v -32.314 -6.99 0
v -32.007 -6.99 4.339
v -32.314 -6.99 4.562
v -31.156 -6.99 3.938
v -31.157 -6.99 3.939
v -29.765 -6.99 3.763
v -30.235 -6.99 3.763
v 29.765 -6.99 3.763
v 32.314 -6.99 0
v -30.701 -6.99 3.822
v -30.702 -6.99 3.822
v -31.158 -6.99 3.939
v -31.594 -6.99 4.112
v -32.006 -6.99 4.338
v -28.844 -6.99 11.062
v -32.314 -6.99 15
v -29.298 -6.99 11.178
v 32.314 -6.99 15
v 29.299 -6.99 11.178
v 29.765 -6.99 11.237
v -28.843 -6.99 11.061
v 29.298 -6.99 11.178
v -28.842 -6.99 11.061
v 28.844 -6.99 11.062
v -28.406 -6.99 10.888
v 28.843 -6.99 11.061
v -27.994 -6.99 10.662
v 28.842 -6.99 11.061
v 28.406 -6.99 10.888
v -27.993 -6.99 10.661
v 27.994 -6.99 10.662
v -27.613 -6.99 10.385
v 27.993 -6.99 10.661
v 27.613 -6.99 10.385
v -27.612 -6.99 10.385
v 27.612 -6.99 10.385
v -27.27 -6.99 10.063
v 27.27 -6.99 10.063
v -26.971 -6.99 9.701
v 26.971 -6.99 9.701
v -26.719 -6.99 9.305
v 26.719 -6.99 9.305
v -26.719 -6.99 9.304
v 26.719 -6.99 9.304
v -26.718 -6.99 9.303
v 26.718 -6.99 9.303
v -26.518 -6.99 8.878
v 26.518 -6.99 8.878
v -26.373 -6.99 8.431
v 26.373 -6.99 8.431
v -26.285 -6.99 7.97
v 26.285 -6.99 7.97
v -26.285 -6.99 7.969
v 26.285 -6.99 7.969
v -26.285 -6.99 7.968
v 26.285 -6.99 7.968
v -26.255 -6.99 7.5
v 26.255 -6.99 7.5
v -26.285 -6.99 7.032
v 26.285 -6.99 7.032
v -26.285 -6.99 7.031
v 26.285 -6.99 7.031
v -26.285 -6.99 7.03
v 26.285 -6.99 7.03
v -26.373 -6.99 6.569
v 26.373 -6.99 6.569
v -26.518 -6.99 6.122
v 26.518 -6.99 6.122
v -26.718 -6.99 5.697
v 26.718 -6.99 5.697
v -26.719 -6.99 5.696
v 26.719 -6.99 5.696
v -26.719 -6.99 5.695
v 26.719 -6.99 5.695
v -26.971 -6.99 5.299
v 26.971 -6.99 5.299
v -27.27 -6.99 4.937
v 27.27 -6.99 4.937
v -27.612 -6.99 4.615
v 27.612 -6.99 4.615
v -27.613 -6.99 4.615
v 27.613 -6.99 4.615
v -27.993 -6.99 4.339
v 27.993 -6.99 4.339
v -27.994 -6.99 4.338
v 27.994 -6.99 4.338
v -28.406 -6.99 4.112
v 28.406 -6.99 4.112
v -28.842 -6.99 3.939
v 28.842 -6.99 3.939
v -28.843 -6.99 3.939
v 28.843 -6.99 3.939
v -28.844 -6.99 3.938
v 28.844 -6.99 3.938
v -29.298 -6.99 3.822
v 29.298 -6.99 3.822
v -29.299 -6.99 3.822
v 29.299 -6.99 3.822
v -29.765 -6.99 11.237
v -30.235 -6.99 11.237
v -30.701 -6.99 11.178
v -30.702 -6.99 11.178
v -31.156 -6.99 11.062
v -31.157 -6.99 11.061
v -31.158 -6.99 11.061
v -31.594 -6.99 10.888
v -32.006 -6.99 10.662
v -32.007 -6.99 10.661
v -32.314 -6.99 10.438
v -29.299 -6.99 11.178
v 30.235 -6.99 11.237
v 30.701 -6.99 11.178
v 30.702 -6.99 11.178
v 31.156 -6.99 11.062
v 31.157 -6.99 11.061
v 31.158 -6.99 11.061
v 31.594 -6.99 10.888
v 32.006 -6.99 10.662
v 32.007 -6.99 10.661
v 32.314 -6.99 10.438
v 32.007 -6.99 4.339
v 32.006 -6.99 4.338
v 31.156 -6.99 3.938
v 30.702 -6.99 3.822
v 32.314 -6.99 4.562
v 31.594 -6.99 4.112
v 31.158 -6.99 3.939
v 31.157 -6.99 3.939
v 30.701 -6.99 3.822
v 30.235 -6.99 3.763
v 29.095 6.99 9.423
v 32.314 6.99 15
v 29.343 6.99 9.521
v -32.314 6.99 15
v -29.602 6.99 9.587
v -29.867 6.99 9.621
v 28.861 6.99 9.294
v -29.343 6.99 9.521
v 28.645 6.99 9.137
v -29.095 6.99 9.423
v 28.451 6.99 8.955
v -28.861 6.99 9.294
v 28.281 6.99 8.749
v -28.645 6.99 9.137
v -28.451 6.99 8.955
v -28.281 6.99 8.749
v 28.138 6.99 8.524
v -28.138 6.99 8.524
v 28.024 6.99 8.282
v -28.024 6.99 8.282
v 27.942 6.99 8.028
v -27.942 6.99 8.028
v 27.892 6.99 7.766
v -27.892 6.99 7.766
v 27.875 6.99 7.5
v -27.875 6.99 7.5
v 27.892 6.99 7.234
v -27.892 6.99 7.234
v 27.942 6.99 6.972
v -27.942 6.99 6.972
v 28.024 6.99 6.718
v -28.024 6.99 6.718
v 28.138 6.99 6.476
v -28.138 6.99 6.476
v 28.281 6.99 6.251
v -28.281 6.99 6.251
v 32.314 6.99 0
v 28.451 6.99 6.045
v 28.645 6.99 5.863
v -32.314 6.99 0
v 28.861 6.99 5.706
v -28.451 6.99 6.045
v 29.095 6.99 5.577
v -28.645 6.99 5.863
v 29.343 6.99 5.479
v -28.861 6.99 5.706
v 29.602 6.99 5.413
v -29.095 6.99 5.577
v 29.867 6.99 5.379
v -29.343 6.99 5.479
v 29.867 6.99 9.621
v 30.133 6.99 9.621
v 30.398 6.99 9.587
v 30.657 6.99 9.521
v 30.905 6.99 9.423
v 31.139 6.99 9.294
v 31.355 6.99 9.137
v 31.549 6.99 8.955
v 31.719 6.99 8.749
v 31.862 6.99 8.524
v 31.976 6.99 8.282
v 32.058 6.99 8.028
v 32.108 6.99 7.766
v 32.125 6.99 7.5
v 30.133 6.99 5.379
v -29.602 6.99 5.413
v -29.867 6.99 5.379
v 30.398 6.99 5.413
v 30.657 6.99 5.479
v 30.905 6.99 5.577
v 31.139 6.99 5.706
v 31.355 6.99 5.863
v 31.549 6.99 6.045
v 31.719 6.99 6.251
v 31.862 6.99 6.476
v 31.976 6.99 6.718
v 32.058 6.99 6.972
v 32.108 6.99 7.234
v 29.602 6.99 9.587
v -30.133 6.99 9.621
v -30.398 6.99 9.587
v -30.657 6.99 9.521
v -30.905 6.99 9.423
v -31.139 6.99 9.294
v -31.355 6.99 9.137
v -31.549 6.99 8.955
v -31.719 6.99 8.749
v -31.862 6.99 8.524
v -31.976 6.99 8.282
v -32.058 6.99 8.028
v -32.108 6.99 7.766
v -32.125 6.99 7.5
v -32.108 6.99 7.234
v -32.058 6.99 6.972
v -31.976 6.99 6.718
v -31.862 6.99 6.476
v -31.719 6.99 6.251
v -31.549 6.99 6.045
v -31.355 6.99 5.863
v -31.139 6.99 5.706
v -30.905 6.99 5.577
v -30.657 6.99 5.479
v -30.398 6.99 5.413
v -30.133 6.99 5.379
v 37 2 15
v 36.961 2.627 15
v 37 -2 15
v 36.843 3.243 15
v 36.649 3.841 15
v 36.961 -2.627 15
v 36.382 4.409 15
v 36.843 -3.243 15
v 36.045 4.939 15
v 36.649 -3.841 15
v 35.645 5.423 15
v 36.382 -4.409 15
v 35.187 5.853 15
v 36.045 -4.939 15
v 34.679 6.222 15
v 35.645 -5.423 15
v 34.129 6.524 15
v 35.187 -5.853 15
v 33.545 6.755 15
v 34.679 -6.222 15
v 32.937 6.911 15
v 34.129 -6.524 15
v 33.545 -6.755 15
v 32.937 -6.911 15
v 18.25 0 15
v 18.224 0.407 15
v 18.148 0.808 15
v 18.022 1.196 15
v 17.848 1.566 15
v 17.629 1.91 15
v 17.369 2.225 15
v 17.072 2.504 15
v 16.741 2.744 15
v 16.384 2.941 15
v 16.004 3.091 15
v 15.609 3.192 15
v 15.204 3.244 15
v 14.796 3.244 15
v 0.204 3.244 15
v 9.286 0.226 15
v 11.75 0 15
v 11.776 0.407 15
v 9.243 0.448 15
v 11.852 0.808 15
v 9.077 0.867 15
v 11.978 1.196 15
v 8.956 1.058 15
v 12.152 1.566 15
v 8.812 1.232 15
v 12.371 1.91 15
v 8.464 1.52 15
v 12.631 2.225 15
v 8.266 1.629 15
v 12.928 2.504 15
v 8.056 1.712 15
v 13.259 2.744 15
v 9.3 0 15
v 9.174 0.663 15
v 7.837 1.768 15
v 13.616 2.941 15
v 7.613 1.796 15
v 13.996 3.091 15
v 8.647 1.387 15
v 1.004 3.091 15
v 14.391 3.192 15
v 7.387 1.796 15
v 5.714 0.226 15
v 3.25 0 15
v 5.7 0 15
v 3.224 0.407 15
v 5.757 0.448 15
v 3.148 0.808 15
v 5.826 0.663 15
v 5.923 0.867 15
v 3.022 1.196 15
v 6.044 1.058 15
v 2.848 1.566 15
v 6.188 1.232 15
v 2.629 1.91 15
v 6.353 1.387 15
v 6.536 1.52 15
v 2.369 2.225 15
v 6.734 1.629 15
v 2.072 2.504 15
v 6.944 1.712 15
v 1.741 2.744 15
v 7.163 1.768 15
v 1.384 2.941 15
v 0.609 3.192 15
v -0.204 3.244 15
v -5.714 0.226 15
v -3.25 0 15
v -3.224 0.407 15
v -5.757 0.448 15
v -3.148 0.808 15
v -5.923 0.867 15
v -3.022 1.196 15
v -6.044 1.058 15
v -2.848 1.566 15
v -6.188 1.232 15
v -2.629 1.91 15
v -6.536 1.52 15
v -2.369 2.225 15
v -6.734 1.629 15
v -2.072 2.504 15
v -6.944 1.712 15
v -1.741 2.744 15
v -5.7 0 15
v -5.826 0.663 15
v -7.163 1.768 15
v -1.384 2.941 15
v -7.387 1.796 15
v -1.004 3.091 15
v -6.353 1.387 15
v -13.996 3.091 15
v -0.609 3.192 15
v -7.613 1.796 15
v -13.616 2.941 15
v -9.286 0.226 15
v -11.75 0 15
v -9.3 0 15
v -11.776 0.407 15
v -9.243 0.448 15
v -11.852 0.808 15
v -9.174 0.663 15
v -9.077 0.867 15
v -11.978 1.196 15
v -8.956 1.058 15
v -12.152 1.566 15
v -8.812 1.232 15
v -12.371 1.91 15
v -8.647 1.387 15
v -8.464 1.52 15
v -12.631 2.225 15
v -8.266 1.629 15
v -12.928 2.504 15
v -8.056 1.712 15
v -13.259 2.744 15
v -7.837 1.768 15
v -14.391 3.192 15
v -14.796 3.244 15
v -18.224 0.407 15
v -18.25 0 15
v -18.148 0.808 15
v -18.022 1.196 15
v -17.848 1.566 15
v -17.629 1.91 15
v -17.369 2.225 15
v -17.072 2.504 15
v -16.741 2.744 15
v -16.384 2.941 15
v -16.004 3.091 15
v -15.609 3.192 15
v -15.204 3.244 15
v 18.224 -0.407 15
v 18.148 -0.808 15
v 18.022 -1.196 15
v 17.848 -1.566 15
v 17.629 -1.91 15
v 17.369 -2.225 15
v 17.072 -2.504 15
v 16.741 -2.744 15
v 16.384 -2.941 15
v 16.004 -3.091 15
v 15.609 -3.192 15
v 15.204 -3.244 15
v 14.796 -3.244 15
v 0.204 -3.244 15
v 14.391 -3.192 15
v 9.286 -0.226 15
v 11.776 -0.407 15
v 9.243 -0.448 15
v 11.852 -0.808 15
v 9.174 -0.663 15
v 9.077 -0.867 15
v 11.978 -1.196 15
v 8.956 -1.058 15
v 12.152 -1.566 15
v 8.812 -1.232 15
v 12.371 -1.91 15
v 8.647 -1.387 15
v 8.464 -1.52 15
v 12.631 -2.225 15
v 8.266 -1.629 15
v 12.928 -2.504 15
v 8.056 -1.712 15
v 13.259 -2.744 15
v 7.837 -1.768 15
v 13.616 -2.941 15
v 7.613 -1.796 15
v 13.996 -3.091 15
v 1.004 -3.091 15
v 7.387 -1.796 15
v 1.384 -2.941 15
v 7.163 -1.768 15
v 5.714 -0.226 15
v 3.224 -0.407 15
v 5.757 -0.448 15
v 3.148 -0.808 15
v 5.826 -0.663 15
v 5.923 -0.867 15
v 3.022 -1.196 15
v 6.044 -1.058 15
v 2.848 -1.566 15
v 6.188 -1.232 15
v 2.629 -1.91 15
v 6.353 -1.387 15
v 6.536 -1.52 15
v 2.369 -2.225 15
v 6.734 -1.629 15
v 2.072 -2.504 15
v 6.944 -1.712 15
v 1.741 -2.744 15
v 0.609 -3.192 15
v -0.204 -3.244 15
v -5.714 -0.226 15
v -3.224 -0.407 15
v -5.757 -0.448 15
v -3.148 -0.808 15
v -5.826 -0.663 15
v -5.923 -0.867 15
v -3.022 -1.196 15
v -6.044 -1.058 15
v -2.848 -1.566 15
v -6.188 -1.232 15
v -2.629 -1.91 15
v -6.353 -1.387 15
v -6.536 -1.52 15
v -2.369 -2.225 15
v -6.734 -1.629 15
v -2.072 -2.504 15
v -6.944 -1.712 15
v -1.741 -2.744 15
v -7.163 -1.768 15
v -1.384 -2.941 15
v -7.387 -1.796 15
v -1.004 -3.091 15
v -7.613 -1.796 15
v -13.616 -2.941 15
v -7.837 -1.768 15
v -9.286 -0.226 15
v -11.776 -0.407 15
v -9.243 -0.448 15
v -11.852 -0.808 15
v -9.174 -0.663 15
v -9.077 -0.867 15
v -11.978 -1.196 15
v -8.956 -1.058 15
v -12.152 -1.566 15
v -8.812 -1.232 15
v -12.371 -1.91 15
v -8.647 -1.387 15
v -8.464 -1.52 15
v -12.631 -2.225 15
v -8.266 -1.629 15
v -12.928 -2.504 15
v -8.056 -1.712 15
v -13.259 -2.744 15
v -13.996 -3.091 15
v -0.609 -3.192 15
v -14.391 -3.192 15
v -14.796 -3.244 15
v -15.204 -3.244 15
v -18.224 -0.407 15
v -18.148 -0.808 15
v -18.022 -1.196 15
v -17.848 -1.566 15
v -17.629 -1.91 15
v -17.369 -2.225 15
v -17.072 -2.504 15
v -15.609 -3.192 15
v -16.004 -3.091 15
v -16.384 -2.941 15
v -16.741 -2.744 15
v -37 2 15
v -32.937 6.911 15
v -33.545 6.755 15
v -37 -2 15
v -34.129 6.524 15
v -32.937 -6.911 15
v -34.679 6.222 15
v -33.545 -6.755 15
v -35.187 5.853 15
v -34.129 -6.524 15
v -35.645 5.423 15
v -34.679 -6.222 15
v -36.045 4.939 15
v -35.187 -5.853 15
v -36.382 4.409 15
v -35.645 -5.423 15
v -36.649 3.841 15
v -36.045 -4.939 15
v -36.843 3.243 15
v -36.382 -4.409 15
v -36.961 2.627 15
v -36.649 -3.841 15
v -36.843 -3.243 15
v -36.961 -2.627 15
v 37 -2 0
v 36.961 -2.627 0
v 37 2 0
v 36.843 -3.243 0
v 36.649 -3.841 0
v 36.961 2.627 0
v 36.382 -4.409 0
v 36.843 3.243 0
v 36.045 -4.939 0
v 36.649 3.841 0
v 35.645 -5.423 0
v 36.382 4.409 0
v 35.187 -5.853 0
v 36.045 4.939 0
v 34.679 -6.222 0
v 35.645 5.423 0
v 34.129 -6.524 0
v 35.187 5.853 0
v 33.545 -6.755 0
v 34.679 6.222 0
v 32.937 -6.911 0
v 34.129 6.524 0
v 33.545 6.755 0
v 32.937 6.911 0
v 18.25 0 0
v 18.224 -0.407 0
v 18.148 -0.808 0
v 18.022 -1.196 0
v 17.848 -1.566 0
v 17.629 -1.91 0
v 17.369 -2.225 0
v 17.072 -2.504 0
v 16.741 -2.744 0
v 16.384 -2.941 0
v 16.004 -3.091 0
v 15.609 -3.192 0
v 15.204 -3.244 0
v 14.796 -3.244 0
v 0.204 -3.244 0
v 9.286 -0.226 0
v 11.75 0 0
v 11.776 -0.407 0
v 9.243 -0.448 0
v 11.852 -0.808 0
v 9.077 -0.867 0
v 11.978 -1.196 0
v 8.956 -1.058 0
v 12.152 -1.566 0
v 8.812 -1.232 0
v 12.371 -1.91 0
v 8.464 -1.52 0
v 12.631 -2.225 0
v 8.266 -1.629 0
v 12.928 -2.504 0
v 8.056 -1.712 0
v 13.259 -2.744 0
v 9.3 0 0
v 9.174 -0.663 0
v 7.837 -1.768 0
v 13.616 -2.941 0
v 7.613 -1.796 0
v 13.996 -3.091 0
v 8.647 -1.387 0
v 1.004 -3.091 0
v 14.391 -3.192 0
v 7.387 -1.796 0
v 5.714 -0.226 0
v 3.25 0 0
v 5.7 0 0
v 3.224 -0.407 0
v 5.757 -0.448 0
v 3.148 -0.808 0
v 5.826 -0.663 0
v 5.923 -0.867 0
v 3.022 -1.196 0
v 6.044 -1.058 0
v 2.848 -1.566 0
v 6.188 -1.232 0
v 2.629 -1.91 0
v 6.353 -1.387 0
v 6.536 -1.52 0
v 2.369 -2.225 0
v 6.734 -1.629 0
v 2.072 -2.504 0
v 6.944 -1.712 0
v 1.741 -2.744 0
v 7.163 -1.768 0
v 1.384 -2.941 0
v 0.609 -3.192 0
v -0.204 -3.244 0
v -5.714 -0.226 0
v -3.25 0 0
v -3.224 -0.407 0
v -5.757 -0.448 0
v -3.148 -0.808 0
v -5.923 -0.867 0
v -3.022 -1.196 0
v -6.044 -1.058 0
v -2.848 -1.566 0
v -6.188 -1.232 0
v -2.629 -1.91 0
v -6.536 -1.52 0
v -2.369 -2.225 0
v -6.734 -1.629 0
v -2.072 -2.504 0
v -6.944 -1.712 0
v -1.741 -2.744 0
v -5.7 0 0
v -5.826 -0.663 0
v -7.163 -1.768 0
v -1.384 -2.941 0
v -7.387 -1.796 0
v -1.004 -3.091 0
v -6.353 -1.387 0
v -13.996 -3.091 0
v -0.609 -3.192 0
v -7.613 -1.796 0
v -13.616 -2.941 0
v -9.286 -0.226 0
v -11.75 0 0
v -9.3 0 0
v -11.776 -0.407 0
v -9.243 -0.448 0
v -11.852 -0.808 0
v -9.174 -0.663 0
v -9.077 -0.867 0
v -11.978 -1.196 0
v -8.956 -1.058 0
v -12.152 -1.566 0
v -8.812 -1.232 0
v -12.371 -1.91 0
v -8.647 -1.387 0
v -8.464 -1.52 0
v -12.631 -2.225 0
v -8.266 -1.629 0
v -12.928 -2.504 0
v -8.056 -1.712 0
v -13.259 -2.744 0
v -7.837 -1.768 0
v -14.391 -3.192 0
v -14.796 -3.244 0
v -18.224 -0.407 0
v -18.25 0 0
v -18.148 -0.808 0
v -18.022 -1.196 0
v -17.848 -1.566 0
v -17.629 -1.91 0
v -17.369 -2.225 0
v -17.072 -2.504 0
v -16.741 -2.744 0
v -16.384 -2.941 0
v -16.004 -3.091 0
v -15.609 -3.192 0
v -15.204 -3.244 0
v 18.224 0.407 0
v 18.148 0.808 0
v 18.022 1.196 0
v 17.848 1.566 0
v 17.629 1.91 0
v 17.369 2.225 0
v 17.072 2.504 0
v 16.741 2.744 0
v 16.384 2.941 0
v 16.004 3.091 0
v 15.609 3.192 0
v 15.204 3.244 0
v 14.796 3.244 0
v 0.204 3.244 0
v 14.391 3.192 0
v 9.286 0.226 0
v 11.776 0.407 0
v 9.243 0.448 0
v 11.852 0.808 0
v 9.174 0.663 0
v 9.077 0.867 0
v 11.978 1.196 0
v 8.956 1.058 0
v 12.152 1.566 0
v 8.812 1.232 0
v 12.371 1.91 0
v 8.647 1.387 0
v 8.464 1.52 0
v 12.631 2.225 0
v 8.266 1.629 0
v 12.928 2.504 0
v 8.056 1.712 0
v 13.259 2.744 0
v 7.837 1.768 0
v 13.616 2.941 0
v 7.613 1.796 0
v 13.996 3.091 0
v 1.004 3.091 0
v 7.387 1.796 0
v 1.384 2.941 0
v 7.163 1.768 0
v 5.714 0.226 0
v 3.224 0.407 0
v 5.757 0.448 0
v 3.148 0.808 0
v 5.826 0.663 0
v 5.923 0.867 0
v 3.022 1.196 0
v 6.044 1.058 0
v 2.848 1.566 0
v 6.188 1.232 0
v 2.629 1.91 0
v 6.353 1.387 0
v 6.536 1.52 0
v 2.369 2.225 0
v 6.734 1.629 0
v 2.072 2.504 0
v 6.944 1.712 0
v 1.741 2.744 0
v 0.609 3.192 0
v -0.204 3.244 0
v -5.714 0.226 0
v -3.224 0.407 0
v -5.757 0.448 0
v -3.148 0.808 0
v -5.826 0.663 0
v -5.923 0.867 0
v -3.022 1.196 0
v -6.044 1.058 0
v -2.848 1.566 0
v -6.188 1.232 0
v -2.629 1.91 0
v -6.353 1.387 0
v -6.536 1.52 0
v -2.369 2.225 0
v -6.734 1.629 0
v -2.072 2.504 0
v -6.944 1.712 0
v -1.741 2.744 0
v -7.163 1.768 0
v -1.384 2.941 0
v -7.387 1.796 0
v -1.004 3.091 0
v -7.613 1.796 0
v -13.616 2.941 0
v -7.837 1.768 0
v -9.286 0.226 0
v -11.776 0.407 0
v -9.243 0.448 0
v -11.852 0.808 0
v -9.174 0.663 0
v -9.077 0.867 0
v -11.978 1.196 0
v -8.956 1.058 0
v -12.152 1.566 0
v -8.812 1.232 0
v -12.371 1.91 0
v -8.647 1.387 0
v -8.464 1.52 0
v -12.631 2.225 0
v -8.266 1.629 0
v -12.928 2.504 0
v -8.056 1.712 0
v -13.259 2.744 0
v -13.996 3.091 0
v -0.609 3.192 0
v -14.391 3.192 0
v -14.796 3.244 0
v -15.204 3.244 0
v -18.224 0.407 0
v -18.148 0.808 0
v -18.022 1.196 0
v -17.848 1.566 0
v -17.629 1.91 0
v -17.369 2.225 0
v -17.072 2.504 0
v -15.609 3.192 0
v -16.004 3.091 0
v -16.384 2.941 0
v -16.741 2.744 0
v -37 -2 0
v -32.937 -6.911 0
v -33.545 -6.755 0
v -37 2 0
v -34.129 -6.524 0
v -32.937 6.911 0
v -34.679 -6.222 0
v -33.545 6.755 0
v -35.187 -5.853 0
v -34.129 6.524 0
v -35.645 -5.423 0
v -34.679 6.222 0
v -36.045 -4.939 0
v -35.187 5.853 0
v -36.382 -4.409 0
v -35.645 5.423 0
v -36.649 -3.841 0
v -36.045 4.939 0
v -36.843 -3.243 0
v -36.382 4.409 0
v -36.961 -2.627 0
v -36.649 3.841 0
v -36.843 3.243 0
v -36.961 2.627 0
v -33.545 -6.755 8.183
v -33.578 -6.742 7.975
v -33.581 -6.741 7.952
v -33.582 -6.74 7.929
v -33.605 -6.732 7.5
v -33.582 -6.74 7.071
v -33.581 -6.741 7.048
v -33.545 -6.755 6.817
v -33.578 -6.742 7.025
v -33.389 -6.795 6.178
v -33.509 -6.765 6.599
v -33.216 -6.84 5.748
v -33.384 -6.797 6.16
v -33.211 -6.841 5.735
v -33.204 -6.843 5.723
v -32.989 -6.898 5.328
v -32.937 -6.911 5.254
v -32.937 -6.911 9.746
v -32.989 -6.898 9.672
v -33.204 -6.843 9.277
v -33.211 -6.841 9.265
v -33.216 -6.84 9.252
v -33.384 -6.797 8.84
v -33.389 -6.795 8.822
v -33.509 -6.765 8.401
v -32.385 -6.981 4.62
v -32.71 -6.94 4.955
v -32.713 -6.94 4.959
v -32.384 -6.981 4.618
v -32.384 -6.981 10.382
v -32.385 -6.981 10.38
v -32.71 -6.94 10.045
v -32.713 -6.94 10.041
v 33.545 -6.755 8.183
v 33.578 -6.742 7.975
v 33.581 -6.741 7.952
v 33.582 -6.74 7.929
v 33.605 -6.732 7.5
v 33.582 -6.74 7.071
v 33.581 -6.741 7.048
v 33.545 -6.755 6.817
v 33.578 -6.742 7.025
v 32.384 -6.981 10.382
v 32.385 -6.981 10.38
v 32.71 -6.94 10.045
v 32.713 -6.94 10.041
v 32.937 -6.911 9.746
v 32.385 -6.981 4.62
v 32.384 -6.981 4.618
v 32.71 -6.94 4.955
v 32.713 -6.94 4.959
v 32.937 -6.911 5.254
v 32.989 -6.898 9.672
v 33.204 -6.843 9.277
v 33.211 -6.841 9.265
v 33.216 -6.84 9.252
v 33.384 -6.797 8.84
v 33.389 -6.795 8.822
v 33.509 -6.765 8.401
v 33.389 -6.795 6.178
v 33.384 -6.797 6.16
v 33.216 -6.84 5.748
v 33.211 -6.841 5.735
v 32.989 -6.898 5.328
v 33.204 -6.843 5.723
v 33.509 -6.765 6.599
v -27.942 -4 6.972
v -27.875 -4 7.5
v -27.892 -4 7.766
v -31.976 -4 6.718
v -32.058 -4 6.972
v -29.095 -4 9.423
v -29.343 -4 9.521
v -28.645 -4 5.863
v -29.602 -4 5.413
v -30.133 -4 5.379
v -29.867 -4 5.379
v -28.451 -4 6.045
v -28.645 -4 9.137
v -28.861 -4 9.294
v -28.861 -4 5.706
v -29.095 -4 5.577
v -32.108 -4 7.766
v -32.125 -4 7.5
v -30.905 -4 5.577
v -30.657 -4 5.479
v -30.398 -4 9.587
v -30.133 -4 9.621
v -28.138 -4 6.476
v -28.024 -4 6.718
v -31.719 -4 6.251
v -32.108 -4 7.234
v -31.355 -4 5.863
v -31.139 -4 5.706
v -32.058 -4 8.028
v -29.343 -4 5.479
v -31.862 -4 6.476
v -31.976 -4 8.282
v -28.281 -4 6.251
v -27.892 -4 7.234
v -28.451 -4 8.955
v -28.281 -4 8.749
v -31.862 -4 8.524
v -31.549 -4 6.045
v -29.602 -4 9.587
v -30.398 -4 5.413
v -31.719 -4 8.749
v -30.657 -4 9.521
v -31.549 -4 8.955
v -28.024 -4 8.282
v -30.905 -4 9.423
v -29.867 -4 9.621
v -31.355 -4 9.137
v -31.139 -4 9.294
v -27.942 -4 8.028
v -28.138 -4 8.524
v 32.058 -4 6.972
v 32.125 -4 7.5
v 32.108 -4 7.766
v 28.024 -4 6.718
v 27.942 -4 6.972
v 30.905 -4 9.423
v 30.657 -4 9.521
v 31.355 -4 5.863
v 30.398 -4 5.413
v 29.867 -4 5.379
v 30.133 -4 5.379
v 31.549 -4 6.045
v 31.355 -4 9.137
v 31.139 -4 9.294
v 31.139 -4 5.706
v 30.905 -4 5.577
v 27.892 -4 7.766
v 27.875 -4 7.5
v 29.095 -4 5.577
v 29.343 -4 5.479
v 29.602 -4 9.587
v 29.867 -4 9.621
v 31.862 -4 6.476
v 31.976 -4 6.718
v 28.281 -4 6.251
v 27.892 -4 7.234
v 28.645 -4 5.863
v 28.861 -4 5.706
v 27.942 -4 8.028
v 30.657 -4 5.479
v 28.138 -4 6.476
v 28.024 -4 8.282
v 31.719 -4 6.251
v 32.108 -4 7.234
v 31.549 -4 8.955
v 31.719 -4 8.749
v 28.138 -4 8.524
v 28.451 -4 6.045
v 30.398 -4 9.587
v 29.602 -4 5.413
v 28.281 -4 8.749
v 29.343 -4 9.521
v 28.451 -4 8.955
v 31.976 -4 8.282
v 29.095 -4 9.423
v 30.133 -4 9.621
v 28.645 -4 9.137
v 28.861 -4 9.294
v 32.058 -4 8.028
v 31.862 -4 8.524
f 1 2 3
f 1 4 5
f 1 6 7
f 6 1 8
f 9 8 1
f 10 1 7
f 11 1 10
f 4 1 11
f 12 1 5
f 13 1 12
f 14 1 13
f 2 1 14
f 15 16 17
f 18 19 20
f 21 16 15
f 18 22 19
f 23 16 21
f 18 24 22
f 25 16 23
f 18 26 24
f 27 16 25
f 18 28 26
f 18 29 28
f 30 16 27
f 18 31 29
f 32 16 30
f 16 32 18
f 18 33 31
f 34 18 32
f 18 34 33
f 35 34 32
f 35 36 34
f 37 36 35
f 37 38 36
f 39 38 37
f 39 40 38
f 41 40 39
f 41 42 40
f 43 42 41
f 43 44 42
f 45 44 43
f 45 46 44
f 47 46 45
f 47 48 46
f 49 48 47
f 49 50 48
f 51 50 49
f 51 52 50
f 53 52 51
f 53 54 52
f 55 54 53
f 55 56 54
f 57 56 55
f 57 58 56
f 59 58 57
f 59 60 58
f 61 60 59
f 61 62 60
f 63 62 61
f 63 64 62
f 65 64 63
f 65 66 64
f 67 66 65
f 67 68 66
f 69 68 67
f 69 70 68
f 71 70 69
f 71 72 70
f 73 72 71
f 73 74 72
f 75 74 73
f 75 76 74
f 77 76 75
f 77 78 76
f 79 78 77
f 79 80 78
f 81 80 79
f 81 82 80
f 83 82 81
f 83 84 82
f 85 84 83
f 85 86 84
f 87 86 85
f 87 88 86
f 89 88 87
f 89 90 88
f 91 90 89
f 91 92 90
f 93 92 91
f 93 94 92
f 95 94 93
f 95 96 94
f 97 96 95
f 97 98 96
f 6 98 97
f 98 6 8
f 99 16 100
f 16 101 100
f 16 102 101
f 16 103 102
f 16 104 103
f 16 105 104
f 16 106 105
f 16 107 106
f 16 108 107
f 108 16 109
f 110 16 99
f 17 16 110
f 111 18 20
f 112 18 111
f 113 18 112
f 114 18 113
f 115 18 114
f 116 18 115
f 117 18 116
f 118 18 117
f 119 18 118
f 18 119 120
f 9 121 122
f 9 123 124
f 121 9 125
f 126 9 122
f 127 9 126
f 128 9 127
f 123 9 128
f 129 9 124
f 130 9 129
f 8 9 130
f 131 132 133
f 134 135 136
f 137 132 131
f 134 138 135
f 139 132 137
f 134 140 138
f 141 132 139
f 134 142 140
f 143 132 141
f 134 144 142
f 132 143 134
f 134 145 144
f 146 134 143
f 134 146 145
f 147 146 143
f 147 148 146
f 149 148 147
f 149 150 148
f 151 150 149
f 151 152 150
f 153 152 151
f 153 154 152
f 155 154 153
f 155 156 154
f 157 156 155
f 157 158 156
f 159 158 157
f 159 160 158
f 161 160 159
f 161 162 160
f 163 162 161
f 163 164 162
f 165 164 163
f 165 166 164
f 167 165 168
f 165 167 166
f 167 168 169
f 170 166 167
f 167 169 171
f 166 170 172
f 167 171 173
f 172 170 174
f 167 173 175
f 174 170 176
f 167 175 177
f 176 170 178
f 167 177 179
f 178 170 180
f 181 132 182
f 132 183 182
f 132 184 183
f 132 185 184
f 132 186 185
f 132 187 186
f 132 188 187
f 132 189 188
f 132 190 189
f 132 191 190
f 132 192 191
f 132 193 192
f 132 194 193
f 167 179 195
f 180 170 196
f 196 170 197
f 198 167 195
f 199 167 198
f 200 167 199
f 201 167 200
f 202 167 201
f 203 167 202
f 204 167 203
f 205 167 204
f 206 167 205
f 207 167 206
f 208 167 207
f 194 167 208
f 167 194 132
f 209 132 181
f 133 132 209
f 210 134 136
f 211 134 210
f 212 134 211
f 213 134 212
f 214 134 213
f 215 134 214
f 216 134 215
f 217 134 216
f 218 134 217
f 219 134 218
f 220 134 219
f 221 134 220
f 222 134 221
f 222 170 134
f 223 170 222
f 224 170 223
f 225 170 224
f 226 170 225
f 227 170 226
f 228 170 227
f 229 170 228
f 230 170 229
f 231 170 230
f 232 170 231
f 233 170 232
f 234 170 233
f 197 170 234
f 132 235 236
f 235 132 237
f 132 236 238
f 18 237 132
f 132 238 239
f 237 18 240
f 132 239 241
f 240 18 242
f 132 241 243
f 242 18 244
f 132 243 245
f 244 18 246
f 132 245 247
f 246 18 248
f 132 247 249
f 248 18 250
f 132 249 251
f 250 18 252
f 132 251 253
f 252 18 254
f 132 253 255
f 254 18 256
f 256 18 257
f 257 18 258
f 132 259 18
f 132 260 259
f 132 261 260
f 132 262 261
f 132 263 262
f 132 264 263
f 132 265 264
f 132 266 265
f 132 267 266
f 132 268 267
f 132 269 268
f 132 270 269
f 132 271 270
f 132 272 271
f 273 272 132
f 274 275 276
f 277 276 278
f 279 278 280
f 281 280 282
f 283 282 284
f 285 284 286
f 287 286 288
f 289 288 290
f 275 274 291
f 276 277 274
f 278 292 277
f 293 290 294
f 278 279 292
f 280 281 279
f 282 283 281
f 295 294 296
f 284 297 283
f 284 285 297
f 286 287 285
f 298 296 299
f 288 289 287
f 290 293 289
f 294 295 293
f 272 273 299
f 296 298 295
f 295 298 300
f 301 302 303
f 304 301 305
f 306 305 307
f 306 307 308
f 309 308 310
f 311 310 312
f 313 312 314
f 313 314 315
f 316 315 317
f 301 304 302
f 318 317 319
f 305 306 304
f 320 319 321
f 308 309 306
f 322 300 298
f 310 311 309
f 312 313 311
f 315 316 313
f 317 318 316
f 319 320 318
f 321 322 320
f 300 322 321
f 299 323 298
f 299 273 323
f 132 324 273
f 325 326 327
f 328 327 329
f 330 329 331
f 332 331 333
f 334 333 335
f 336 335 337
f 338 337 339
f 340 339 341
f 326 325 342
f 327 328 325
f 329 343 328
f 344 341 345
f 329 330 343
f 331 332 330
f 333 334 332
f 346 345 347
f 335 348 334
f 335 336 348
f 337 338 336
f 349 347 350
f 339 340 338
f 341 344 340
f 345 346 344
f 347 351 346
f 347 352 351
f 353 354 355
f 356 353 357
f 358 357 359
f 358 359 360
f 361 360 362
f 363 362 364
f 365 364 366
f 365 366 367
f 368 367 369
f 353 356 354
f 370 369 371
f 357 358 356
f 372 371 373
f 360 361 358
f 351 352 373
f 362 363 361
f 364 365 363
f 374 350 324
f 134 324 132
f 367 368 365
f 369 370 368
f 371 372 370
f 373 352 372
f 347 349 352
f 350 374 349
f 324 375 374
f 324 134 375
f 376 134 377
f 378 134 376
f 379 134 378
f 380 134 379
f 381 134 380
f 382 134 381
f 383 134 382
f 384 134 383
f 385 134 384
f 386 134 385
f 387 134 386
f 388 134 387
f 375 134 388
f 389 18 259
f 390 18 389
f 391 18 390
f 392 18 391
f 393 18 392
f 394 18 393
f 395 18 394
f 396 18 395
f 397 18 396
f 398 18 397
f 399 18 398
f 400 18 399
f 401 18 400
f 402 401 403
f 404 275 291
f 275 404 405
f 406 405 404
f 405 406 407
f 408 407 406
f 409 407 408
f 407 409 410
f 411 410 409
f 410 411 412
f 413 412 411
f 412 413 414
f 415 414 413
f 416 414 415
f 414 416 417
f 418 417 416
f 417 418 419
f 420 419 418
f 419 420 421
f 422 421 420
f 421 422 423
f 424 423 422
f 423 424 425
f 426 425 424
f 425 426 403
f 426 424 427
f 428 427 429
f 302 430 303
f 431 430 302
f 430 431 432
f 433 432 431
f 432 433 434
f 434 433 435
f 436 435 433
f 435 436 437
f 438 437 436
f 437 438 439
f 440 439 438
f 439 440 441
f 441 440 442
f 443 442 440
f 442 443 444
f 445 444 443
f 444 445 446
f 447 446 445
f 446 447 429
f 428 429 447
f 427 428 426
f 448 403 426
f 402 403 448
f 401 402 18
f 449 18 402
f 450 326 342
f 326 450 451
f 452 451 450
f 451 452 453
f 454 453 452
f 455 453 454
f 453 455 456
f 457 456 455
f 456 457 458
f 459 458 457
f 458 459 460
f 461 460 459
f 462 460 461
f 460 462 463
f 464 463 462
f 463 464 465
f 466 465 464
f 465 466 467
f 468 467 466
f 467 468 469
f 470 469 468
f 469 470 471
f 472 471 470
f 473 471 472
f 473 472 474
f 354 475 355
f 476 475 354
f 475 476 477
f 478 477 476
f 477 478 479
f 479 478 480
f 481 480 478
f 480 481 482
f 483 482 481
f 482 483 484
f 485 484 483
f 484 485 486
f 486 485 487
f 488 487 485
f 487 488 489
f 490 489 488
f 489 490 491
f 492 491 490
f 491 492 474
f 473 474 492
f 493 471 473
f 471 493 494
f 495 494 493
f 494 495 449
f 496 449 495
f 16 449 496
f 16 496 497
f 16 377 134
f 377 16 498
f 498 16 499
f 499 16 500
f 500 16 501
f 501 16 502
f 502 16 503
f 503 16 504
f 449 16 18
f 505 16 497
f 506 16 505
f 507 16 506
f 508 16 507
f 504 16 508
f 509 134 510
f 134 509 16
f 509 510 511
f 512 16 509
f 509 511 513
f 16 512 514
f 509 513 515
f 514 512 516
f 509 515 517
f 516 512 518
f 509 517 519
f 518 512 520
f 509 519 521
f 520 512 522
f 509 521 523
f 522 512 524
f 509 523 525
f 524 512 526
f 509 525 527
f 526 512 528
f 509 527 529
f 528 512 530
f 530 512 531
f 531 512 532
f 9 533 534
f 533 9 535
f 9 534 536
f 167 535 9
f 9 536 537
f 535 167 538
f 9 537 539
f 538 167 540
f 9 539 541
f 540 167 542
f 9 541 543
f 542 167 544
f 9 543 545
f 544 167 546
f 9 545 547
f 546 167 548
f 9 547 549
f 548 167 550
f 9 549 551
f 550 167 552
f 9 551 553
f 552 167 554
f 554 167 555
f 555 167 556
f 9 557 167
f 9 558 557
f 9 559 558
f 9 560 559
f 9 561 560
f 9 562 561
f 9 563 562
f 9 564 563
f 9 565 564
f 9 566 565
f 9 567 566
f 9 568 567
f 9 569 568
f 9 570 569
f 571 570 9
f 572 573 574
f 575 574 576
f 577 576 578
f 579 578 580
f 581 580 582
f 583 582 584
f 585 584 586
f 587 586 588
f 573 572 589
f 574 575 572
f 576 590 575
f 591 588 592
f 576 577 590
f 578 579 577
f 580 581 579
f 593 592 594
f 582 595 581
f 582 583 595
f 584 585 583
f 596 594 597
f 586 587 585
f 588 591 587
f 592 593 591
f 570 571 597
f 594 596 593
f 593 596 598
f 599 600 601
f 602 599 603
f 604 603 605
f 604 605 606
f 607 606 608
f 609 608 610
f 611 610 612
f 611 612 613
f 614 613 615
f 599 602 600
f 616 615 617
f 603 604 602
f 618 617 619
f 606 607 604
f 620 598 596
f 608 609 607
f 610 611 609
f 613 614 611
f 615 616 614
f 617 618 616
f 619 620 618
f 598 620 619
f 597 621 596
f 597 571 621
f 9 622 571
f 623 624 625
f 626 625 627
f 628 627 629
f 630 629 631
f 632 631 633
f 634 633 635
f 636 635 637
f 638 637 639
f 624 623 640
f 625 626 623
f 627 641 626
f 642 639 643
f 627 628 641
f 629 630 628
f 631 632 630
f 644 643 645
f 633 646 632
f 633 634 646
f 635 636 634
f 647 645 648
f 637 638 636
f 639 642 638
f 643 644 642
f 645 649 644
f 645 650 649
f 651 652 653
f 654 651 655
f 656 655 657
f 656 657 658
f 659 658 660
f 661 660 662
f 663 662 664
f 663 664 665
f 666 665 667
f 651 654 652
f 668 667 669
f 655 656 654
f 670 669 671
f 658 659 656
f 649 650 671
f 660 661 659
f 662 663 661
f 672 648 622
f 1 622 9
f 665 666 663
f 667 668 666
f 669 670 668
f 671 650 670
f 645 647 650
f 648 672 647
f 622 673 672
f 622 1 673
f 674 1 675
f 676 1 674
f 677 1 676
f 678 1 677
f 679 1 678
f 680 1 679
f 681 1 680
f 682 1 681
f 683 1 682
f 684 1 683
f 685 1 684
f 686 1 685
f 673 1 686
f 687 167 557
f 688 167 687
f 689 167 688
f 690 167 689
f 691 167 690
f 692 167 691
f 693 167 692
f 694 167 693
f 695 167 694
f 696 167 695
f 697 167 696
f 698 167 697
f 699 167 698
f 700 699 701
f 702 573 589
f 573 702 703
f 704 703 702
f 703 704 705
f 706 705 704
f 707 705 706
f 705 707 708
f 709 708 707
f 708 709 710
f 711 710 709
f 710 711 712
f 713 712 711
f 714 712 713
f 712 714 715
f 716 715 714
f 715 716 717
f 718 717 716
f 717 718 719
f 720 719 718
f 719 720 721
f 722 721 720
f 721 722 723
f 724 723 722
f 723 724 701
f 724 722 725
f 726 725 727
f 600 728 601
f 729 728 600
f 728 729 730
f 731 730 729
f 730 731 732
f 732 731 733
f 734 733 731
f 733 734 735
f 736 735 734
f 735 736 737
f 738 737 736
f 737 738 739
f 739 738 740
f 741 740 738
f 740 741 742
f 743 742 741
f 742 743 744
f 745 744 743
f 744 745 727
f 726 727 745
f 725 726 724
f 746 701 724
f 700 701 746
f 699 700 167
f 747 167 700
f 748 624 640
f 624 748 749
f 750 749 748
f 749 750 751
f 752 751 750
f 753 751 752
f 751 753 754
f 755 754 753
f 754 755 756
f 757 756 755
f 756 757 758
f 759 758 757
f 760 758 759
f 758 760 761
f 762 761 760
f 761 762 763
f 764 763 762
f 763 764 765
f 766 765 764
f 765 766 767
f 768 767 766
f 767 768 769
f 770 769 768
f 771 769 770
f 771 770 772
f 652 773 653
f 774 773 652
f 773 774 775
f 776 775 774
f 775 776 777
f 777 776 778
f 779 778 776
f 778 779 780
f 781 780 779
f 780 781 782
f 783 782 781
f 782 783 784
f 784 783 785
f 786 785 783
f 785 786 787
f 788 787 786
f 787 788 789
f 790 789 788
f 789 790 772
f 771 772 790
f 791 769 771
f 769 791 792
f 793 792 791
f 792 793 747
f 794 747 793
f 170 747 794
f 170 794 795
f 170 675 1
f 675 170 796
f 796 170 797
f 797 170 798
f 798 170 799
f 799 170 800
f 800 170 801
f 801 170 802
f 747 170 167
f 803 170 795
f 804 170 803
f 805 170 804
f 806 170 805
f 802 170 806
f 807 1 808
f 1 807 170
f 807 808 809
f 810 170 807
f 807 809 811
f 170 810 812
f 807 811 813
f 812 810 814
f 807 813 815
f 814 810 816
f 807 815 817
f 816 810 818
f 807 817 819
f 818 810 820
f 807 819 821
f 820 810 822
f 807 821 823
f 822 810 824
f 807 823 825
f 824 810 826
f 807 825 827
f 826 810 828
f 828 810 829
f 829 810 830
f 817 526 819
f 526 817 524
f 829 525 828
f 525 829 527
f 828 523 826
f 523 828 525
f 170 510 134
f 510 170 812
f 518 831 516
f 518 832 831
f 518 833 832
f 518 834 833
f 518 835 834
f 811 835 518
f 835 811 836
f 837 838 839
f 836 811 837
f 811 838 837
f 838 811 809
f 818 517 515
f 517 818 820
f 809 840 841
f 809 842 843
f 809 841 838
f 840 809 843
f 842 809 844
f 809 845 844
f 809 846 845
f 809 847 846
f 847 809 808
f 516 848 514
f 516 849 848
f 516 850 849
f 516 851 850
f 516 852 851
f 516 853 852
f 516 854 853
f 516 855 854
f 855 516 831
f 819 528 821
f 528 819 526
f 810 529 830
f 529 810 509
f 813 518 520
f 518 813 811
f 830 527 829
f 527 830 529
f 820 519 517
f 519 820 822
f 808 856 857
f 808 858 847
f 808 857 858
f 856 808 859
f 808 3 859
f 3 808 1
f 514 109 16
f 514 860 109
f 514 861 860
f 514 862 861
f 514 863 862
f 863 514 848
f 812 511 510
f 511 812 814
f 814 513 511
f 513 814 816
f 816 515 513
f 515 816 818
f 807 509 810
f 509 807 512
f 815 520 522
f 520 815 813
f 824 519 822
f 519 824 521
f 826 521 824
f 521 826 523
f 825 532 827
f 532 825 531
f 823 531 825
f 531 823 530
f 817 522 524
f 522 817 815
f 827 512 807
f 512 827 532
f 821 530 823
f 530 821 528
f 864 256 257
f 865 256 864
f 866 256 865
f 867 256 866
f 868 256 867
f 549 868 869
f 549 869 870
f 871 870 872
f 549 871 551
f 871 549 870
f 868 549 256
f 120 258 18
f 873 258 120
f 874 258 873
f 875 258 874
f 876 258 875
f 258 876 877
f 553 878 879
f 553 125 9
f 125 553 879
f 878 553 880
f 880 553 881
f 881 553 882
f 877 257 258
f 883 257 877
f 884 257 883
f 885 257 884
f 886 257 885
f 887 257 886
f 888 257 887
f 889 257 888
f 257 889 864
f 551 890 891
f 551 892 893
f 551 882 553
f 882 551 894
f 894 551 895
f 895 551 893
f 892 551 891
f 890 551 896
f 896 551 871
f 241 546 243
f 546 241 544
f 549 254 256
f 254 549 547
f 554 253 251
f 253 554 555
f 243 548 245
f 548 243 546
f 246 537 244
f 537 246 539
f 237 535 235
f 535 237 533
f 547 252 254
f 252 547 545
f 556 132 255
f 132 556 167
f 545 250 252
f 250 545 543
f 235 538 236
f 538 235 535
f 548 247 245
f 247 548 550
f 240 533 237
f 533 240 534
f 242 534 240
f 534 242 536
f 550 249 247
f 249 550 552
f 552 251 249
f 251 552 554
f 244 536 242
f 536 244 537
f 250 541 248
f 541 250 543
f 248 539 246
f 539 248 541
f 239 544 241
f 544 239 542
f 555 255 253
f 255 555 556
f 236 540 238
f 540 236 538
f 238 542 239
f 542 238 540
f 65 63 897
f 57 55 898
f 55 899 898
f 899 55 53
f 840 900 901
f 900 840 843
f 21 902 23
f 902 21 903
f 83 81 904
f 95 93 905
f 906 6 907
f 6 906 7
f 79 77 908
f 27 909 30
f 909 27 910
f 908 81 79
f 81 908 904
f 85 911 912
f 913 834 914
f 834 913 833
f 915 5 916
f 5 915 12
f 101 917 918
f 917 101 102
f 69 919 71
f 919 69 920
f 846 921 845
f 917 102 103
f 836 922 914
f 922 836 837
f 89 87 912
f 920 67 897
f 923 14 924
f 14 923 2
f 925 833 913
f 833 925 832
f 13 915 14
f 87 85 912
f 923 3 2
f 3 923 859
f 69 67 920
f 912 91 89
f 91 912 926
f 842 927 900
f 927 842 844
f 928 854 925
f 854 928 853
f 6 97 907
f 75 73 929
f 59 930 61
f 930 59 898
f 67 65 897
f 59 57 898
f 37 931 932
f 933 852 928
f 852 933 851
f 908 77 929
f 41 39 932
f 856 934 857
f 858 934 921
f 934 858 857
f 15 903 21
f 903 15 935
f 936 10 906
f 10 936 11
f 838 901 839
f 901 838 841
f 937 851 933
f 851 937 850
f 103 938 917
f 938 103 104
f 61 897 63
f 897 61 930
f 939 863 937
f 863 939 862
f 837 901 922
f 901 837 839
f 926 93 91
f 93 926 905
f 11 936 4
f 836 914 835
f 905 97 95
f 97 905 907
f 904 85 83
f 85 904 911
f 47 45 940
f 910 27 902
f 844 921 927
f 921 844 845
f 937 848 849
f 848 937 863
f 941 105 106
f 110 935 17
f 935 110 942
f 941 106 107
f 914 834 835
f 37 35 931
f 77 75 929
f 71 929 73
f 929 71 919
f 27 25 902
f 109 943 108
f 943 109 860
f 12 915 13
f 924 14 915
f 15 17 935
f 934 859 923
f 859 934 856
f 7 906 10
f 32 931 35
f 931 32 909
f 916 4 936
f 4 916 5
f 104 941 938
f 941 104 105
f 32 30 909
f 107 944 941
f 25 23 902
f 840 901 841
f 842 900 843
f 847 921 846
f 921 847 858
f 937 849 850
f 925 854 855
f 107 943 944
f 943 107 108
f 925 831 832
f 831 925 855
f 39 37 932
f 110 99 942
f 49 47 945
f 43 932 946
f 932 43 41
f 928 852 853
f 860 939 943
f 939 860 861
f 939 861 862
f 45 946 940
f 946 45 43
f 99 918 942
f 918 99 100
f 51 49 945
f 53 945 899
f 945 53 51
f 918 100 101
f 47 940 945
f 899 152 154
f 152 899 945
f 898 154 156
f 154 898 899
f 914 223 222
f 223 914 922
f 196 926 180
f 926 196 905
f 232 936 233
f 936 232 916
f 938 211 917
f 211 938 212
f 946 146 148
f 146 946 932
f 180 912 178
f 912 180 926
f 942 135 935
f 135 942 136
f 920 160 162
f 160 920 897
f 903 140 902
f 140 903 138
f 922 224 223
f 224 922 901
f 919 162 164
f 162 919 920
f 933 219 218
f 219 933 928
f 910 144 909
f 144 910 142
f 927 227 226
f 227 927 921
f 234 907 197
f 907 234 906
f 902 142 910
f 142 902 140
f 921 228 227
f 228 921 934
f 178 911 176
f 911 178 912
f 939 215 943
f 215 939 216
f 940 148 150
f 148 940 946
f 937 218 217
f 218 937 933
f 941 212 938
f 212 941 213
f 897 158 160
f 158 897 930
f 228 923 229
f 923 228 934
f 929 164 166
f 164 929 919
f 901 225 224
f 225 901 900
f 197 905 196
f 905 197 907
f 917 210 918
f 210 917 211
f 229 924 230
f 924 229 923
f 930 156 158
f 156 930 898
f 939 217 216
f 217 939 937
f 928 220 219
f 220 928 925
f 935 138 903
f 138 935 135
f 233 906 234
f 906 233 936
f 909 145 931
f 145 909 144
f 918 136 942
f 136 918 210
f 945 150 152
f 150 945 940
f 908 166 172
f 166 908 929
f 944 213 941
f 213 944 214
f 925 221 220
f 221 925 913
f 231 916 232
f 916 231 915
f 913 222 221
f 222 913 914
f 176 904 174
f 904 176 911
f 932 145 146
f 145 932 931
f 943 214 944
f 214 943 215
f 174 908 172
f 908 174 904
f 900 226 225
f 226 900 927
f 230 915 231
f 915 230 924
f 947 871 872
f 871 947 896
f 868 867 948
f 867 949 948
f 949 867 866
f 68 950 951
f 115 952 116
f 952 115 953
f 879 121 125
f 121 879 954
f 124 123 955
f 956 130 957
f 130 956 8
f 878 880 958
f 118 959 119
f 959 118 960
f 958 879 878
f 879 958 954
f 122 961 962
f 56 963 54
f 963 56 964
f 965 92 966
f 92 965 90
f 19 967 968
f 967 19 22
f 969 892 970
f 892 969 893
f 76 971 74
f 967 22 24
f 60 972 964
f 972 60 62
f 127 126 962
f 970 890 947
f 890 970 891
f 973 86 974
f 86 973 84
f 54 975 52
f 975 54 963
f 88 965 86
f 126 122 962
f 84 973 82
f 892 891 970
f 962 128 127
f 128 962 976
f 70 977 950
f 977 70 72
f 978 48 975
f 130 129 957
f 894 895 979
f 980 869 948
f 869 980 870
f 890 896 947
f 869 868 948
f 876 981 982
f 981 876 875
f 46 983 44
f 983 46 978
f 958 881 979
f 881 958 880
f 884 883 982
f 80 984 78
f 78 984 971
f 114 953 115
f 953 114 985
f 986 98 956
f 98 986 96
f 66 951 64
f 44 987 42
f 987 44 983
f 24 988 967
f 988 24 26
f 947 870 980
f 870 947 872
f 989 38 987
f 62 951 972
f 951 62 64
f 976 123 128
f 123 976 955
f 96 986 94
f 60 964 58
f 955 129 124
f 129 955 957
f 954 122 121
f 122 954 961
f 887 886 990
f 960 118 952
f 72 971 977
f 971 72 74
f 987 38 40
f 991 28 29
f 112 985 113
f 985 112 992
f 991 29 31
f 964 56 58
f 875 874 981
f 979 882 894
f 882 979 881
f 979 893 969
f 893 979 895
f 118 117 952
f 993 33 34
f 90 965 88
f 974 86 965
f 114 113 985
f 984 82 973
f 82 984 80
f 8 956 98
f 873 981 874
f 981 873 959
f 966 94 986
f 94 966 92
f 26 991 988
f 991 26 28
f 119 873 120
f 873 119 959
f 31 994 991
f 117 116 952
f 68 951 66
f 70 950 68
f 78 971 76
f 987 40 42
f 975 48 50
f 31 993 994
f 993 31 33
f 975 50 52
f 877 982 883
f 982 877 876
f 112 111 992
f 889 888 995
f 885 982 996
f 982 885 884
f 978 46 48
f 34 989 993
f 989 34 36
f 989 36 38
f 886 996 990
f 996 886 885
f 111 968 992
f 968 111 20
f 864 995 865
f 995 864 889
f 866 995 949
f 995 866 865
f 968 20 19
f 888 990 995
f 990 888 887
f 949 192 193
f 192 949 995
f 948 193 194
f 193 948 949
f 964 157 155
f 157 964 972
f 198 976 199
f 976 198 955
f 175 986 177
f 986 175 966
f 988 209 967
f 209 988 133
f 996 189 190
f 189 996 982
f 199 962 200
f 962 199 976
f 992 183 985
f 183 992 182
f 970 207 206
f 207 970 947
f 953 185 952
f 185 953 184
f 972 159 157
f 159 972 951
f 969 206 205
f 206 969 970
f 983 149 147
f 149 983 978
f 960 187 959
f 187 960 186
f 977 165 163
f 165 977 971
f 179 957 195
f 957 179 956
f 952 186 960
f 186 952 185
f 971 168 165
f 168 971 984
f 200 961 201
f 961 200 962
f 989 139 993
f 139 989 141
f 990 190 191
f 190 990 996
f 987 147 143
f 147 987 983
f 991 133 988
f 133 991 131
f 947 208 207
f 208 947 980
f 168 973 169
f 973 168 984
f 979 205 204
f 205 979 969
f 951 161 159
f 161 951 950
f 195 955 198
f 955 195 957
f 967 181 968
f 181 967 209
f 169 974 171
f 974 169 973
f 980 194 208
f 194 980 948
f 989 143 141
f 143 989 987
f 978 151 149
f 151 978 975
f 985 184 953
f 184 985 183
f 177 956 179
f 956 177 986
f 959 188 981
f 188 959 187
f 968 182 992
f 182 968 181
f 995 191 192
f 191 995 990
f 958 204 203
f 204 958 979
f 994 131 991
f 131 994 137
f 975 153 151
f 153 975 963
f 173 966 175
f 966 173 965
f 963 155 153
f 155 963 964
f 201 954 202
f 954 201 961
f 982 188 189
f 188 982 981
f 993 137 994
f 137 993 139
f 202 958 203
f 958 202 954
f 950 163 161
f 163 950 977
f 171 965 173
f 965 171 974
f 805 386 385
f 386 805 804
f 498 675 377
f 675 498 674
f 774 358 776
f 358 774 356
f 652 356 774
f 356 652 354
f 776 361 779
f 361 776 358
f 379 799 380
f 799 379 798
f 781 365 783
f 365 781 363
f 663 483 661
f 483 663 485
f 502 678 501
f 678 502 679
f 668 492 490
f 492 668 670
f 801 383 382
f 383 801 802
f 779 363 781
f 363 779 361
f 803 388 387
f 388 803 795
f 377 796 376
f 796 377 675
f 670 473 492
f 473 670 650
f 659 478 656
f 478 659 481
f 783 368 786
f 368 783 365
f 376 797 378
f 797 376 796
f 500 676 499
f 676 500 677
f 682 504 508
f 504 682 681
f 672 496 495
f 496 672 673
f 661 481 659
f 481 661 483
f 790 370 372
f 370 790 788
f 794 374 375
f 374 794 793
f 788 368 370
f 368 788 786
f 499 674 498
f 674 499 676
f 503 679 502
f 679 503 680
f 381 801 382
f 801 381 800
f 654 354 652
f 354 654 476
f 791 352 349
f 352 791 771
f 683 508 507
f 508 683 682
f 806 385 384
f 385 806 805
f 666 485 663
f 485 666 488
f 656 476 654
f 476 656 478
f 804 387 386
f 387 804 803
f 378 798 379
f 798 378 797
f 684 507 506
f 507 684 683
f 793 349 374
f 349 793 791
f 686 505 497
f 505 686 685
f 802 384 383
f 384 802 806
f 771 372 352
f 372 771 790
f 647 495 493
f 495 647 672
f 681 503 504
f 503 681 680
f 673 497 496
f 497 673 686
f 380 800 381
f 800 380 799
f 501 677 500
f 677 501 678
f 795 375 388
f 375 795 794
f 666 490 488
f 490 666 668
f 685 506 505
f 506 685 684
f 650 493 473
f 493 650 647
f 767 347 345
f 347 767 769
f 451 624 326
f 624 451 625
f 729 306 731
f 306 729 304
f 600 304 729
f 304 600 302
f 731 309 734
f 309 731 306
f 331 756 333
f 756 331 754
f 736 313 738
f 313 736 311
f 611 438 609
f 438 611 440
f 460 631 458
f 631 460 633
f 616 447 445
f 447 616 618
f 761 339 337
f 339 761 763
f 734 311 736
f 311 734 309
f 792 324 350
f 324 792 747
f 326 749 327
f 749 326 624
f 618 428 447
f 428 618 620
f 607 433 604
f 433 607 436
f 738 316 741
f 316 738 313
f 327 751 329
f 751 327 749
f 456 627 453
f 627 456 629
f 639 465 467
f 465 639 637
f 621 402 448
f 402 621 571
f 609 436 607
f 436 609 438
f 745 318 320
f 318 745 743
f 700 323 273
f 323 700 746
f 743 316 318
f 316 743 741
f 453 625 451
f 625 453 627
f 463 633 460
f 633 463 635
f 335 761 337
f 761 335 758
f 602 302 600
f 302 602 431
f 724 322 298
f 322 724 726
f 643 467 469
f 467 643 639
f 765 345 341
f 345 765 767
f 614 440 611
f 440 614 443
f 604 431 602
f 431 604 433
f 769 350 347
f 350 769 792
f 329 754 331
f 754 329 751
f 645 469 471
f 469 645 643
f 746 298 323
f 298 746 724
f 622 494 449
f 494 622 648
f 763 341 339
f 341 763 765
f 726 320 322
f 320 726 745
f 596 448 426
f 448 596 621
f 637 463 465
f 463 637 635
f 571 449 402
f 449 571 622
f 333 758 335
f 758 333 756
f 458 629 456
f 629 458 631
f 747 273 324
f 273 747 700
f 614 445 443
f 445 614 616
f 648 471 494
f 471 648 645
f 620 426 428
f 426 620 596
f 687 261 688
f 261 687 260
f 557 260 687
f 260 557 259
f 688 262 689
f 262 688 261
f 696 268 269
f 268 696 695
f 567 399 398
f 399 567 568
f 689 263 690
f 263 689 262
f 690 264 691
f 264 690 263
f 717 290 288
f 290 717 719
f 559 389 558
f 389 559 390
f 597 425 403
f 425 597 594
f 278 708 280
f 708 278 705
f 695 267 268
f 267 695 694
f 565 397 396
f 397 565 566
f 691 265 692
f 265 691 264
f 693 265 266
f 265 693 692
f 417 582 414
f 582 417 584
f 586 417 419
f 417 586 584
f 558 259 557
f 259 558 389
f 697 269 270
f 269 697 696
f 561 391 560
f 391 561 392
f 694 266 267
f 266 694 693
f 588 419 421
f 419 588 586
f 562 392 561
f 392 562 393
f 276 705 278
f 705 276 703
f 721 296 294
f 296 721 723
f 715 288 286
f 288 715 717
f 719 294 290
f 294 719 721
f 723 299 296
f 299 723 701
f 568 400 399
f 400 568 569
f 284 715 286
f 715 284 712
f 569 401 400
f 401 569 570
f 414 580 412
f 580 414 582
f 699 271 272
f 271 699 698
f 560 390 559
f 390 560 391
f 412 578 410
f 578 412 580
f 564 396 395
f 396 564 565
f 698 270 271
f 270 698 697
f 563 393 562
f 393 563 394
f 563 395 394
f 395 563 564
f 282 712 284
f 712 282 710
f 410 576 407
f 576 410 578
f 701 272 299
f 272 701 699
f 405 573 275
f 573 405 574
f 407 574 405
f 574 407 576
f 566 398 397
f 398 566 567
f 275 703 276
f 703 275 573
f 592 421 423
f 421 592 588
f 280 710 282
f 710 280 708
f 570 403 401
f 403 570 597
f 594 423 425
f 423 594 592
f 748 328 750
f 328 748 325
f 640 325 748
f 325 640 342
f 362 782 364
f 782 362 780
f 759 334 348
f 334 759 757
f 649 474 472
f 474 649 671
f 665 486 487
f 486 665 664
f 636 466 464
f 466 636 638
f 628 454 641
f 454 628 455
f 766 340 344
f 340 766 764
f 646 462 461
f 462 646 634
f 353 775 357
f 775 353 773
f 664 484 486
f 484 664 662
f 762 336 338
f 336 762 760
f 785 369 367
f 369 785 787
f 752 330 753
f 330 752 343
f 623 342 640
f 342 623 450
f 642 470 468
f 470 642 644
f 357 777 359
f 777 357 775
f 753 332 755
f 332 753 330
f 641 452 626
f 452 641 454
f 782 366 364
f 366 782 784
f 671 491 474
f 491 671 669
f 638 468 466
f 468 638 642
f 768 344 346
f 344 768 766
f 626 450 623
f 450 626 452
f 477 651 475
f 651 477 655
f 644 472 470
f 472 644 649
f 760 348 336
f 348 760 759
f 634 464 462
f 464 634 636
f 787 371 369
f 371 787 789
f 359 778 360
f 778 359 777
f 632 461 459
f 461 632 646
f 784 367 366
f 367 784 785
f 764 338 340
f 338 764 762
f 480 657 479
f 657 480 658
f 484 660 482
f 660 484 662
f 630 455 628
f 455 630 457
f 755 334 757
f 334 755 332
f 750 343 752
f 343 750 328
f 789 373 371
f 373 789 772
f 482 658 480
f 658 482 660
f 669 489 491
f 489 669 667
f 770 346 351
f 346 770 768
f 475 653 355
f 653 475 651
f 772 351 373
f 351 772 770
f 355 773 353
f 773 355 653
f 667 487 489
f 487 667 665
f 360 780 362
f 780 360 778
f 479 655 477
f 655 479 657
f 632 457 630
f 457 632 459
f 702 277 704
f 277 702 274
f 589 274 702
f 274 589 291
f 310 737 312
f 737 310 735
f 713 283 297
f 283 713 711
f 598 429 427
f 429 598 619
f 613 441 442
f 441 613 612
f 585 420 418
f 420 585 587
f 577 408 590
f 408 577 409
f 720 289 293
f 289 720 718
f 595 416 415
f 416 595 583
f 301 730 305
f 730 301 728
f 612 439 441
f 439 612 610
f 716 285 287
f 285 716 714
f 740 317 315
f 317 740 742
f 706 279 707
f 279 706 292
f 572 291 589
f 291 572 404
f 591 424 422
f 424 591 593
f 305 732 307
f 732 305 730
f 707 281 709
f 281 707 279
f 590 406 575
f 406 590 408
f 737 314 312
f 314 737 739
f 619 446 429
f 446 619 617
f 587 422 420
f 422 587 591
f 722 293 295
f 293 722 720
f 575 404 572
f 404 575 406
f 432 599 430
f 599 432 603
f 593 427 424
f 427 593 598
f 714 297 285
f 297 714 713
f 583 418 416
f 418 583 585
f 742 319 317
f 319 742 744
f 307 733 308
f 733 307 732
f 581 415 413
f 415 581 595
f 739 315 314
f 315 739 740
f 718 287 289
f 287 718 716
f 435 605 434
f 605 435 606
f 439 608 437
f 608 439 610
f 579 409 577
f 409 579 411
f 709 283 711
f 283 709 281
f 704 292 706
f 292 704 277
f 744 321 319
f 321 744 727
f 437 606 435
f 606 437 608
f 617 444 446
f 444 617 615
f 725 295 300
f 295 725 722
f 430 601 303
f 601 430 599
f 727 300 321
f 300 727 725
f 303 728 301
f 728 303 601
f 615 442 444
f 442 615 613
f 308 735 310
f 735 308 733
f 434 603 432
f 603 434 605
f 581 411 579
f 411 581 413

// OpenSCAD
$fn = 50;


difference() {
	union() {
		hull() {
			translate(v = [-17.0000000000, 2.0000000000, 0]) {
				cylinder(h = 15, r = 5);
			}
			translate(v = [17.0000000000, 2.0000000000, 0]) {
				cylinder(h = 15, r = 5);
			}
			translate(v = [-17.0000000000, -2.0000000000, 0]) {
				cylinder(h = 15, r = 5);
			}
			translate(v = [17.0000000000, -2.0000000000, 0]) {
				cylinder(h = 15, r = 5);
			}
		}
		translate(v = [-22.5000000000, 0.0000000000, 0]) {
			hull() {
				translate(v = [-9.5000000000, 2.0000000000, 0]) {
					cylinder(h = 15, r = 5);
				}
				translate(v = [9.5000000000, 2.0000000000, 0]) {
					cylinder(h = 15, r = 5);
				}
				translate(v = [-9.5000000000, -2.0000000000, 0]) {
					cylinder(h = 15, r = 5);
				}
				translate(v = [9.5000000000, -2.0000000000, 0]) {
					cylinder(h = 15, r = 5);
				}
			}
		}
		translate(v = [-22.5000000000, 0.0000000000, 0]) {
			hull() {
				translate(v = [-9.5000000000, 2.0000000000, 0]) {
					cylinder(h = 15, r = 5);
				}
				translate(v = [9.5000000000, 2.0000000000, 0]) {
					cylinder(h = 15, r = 5);
				}
				translate(v = [-9.5000000000, -2.0000000000, 0]) {
					cylinder(h = 15, r = 5);
				}
				translate(v = [9.5000000000, -2.0000000000, 0]) {
					cylinder(h = 15, r = 5);
				}
			}
		}
		translate(v = [22.5000000000, 0.0000000000, 0]) {
			hull() {
				translate(v = [-9.5000000000, 2.0000000000, 0]) {
					cylinder(h = 15, r = 5);
				}
				translate(v = [9.5000000000, 2.0000000000, 0]) {
					cylinder(h = 15, r = 5);
				}
				translate(v = [-9.5000000000, -2.0000000000, 0]) {
					cylinder(h = 15, r = 5);
				}
				translate(v = [9.5000000000, -2.0000000000, 0]) {
					cylinder(h = 15, r = 5);
				}
			}
		}
		translate(v = [22.5000000000, 0.0000000000, 0]) {
			hull() {
				translate(v = [-9.5000000000, 2.0000000000, 0]) {
					cylinder(h = 15, r = 5);
				}
				translate(v = [9.5000000000, 2.0000000000, 0]) {
					cylinder(h = 15, r = 5);
				}
				translate(v = [-9.5000000000, -2.0000000000, 0]) {
					cylinder(h = 15, r = 5);
				}
				translate(v = [9.5000000000, -2.0000000000, 0]) {
					cylinder(h = 15, r = 5);
				}
			}
		}
	}
	union() {
		translate(v = [-30.0000000000, -7.0000000000, 7.5000000000]) {
			rotate(a = [90, 0, 0]) {
				difference() {
					union() {
						#translate(v = [0, 0, -14.0000000000]) {
							cylinder(h = 14, r = 2.0000000000);
						}
						#translate(v = [0, 0, -3]) {
							cylinder(h = 3, r1 = 2.1250000000, r2 = 3.7500000000);
						}
						#translate(v = [0, 0, -14.0000000000]) {
							cylinder(h = 14, r = 2.1250000000);
						}
						#translate(v = [0, 0, -14.0000000000]) {
							cylinder(h = 14, r = 2.0000000000);
						}
					}
					union();
				}
			}
		}
		translate(v = [30.0000000000, -7.0000000000, 7.5000000000]) {
			rotate(a = [90, 0, 0]) {
				difference() {
					union() {
						#translate(v = [0, 0, -14.0000000000]) {
							cylinder(h = 14, r = 2.0000000000);
						}
						#translate(v = [0, 0, -3]) {
							cylinder(h = 3, r1 = 2.1250000000, r2 = 3.7500000000);
						}
						#translate(v = [0, 0, -14.0000000000]) {
							cylinder(h = 14, r = 2.1250000000);
						}
						#translate(v = [0, 0, -14.0000000000]) {
							cylinder(h = 14, r = 2.0000000000);
						}
					}
					union();
				}
			}
		}
		translate(v = [-15.0000000000, 0.0000000000, 0]) {
			translate(v = [0, 0, -100]) {
				cylinder(h = 200, r = 3.2500000000);
			}
		}
		translate(v = [0, 0, -100]) {
			cylinder(h = 200, r = 3.2500000000);
		}
		translate(v = [15.0000000000, 0.0000000000, 0]) {
			translate(v = [0, 0, -100]) {
				cylinder(h = 200, r = 3.2500000000);
			}
		}
		translate(v = [-15.0000000000, 0.0000000000, 0]) {
			translate(v = [0, 0, -100]) {
				cylinder(h = 200, r = 1.8000000000);
			}
		}
		translate(v = [-7.5000000000, 0.0000000000, 0]) {
			translate(v = [0, 0, -100]) {
				cylinder(h = 200, r = 1.8000000000);
			}
		}
		translate(v = [0, 0, -100]) {
			cylinder(h = 200, r = 1.8000000000);
		}
		translate(v = [7.5000000000, 0.0000000000, 0]) {
			translate(v = [0, 0, -100]) {
				cylinder(h = 200, r = 1.8000000000);
			}
		}
		translate(v = [15.0000000000, 0.0000000000, 0]) {
			translate(v = [0, 0, -100]) {
				cylinder(h = 200, r = 1.8000000000);
			}
		}
	}
}
